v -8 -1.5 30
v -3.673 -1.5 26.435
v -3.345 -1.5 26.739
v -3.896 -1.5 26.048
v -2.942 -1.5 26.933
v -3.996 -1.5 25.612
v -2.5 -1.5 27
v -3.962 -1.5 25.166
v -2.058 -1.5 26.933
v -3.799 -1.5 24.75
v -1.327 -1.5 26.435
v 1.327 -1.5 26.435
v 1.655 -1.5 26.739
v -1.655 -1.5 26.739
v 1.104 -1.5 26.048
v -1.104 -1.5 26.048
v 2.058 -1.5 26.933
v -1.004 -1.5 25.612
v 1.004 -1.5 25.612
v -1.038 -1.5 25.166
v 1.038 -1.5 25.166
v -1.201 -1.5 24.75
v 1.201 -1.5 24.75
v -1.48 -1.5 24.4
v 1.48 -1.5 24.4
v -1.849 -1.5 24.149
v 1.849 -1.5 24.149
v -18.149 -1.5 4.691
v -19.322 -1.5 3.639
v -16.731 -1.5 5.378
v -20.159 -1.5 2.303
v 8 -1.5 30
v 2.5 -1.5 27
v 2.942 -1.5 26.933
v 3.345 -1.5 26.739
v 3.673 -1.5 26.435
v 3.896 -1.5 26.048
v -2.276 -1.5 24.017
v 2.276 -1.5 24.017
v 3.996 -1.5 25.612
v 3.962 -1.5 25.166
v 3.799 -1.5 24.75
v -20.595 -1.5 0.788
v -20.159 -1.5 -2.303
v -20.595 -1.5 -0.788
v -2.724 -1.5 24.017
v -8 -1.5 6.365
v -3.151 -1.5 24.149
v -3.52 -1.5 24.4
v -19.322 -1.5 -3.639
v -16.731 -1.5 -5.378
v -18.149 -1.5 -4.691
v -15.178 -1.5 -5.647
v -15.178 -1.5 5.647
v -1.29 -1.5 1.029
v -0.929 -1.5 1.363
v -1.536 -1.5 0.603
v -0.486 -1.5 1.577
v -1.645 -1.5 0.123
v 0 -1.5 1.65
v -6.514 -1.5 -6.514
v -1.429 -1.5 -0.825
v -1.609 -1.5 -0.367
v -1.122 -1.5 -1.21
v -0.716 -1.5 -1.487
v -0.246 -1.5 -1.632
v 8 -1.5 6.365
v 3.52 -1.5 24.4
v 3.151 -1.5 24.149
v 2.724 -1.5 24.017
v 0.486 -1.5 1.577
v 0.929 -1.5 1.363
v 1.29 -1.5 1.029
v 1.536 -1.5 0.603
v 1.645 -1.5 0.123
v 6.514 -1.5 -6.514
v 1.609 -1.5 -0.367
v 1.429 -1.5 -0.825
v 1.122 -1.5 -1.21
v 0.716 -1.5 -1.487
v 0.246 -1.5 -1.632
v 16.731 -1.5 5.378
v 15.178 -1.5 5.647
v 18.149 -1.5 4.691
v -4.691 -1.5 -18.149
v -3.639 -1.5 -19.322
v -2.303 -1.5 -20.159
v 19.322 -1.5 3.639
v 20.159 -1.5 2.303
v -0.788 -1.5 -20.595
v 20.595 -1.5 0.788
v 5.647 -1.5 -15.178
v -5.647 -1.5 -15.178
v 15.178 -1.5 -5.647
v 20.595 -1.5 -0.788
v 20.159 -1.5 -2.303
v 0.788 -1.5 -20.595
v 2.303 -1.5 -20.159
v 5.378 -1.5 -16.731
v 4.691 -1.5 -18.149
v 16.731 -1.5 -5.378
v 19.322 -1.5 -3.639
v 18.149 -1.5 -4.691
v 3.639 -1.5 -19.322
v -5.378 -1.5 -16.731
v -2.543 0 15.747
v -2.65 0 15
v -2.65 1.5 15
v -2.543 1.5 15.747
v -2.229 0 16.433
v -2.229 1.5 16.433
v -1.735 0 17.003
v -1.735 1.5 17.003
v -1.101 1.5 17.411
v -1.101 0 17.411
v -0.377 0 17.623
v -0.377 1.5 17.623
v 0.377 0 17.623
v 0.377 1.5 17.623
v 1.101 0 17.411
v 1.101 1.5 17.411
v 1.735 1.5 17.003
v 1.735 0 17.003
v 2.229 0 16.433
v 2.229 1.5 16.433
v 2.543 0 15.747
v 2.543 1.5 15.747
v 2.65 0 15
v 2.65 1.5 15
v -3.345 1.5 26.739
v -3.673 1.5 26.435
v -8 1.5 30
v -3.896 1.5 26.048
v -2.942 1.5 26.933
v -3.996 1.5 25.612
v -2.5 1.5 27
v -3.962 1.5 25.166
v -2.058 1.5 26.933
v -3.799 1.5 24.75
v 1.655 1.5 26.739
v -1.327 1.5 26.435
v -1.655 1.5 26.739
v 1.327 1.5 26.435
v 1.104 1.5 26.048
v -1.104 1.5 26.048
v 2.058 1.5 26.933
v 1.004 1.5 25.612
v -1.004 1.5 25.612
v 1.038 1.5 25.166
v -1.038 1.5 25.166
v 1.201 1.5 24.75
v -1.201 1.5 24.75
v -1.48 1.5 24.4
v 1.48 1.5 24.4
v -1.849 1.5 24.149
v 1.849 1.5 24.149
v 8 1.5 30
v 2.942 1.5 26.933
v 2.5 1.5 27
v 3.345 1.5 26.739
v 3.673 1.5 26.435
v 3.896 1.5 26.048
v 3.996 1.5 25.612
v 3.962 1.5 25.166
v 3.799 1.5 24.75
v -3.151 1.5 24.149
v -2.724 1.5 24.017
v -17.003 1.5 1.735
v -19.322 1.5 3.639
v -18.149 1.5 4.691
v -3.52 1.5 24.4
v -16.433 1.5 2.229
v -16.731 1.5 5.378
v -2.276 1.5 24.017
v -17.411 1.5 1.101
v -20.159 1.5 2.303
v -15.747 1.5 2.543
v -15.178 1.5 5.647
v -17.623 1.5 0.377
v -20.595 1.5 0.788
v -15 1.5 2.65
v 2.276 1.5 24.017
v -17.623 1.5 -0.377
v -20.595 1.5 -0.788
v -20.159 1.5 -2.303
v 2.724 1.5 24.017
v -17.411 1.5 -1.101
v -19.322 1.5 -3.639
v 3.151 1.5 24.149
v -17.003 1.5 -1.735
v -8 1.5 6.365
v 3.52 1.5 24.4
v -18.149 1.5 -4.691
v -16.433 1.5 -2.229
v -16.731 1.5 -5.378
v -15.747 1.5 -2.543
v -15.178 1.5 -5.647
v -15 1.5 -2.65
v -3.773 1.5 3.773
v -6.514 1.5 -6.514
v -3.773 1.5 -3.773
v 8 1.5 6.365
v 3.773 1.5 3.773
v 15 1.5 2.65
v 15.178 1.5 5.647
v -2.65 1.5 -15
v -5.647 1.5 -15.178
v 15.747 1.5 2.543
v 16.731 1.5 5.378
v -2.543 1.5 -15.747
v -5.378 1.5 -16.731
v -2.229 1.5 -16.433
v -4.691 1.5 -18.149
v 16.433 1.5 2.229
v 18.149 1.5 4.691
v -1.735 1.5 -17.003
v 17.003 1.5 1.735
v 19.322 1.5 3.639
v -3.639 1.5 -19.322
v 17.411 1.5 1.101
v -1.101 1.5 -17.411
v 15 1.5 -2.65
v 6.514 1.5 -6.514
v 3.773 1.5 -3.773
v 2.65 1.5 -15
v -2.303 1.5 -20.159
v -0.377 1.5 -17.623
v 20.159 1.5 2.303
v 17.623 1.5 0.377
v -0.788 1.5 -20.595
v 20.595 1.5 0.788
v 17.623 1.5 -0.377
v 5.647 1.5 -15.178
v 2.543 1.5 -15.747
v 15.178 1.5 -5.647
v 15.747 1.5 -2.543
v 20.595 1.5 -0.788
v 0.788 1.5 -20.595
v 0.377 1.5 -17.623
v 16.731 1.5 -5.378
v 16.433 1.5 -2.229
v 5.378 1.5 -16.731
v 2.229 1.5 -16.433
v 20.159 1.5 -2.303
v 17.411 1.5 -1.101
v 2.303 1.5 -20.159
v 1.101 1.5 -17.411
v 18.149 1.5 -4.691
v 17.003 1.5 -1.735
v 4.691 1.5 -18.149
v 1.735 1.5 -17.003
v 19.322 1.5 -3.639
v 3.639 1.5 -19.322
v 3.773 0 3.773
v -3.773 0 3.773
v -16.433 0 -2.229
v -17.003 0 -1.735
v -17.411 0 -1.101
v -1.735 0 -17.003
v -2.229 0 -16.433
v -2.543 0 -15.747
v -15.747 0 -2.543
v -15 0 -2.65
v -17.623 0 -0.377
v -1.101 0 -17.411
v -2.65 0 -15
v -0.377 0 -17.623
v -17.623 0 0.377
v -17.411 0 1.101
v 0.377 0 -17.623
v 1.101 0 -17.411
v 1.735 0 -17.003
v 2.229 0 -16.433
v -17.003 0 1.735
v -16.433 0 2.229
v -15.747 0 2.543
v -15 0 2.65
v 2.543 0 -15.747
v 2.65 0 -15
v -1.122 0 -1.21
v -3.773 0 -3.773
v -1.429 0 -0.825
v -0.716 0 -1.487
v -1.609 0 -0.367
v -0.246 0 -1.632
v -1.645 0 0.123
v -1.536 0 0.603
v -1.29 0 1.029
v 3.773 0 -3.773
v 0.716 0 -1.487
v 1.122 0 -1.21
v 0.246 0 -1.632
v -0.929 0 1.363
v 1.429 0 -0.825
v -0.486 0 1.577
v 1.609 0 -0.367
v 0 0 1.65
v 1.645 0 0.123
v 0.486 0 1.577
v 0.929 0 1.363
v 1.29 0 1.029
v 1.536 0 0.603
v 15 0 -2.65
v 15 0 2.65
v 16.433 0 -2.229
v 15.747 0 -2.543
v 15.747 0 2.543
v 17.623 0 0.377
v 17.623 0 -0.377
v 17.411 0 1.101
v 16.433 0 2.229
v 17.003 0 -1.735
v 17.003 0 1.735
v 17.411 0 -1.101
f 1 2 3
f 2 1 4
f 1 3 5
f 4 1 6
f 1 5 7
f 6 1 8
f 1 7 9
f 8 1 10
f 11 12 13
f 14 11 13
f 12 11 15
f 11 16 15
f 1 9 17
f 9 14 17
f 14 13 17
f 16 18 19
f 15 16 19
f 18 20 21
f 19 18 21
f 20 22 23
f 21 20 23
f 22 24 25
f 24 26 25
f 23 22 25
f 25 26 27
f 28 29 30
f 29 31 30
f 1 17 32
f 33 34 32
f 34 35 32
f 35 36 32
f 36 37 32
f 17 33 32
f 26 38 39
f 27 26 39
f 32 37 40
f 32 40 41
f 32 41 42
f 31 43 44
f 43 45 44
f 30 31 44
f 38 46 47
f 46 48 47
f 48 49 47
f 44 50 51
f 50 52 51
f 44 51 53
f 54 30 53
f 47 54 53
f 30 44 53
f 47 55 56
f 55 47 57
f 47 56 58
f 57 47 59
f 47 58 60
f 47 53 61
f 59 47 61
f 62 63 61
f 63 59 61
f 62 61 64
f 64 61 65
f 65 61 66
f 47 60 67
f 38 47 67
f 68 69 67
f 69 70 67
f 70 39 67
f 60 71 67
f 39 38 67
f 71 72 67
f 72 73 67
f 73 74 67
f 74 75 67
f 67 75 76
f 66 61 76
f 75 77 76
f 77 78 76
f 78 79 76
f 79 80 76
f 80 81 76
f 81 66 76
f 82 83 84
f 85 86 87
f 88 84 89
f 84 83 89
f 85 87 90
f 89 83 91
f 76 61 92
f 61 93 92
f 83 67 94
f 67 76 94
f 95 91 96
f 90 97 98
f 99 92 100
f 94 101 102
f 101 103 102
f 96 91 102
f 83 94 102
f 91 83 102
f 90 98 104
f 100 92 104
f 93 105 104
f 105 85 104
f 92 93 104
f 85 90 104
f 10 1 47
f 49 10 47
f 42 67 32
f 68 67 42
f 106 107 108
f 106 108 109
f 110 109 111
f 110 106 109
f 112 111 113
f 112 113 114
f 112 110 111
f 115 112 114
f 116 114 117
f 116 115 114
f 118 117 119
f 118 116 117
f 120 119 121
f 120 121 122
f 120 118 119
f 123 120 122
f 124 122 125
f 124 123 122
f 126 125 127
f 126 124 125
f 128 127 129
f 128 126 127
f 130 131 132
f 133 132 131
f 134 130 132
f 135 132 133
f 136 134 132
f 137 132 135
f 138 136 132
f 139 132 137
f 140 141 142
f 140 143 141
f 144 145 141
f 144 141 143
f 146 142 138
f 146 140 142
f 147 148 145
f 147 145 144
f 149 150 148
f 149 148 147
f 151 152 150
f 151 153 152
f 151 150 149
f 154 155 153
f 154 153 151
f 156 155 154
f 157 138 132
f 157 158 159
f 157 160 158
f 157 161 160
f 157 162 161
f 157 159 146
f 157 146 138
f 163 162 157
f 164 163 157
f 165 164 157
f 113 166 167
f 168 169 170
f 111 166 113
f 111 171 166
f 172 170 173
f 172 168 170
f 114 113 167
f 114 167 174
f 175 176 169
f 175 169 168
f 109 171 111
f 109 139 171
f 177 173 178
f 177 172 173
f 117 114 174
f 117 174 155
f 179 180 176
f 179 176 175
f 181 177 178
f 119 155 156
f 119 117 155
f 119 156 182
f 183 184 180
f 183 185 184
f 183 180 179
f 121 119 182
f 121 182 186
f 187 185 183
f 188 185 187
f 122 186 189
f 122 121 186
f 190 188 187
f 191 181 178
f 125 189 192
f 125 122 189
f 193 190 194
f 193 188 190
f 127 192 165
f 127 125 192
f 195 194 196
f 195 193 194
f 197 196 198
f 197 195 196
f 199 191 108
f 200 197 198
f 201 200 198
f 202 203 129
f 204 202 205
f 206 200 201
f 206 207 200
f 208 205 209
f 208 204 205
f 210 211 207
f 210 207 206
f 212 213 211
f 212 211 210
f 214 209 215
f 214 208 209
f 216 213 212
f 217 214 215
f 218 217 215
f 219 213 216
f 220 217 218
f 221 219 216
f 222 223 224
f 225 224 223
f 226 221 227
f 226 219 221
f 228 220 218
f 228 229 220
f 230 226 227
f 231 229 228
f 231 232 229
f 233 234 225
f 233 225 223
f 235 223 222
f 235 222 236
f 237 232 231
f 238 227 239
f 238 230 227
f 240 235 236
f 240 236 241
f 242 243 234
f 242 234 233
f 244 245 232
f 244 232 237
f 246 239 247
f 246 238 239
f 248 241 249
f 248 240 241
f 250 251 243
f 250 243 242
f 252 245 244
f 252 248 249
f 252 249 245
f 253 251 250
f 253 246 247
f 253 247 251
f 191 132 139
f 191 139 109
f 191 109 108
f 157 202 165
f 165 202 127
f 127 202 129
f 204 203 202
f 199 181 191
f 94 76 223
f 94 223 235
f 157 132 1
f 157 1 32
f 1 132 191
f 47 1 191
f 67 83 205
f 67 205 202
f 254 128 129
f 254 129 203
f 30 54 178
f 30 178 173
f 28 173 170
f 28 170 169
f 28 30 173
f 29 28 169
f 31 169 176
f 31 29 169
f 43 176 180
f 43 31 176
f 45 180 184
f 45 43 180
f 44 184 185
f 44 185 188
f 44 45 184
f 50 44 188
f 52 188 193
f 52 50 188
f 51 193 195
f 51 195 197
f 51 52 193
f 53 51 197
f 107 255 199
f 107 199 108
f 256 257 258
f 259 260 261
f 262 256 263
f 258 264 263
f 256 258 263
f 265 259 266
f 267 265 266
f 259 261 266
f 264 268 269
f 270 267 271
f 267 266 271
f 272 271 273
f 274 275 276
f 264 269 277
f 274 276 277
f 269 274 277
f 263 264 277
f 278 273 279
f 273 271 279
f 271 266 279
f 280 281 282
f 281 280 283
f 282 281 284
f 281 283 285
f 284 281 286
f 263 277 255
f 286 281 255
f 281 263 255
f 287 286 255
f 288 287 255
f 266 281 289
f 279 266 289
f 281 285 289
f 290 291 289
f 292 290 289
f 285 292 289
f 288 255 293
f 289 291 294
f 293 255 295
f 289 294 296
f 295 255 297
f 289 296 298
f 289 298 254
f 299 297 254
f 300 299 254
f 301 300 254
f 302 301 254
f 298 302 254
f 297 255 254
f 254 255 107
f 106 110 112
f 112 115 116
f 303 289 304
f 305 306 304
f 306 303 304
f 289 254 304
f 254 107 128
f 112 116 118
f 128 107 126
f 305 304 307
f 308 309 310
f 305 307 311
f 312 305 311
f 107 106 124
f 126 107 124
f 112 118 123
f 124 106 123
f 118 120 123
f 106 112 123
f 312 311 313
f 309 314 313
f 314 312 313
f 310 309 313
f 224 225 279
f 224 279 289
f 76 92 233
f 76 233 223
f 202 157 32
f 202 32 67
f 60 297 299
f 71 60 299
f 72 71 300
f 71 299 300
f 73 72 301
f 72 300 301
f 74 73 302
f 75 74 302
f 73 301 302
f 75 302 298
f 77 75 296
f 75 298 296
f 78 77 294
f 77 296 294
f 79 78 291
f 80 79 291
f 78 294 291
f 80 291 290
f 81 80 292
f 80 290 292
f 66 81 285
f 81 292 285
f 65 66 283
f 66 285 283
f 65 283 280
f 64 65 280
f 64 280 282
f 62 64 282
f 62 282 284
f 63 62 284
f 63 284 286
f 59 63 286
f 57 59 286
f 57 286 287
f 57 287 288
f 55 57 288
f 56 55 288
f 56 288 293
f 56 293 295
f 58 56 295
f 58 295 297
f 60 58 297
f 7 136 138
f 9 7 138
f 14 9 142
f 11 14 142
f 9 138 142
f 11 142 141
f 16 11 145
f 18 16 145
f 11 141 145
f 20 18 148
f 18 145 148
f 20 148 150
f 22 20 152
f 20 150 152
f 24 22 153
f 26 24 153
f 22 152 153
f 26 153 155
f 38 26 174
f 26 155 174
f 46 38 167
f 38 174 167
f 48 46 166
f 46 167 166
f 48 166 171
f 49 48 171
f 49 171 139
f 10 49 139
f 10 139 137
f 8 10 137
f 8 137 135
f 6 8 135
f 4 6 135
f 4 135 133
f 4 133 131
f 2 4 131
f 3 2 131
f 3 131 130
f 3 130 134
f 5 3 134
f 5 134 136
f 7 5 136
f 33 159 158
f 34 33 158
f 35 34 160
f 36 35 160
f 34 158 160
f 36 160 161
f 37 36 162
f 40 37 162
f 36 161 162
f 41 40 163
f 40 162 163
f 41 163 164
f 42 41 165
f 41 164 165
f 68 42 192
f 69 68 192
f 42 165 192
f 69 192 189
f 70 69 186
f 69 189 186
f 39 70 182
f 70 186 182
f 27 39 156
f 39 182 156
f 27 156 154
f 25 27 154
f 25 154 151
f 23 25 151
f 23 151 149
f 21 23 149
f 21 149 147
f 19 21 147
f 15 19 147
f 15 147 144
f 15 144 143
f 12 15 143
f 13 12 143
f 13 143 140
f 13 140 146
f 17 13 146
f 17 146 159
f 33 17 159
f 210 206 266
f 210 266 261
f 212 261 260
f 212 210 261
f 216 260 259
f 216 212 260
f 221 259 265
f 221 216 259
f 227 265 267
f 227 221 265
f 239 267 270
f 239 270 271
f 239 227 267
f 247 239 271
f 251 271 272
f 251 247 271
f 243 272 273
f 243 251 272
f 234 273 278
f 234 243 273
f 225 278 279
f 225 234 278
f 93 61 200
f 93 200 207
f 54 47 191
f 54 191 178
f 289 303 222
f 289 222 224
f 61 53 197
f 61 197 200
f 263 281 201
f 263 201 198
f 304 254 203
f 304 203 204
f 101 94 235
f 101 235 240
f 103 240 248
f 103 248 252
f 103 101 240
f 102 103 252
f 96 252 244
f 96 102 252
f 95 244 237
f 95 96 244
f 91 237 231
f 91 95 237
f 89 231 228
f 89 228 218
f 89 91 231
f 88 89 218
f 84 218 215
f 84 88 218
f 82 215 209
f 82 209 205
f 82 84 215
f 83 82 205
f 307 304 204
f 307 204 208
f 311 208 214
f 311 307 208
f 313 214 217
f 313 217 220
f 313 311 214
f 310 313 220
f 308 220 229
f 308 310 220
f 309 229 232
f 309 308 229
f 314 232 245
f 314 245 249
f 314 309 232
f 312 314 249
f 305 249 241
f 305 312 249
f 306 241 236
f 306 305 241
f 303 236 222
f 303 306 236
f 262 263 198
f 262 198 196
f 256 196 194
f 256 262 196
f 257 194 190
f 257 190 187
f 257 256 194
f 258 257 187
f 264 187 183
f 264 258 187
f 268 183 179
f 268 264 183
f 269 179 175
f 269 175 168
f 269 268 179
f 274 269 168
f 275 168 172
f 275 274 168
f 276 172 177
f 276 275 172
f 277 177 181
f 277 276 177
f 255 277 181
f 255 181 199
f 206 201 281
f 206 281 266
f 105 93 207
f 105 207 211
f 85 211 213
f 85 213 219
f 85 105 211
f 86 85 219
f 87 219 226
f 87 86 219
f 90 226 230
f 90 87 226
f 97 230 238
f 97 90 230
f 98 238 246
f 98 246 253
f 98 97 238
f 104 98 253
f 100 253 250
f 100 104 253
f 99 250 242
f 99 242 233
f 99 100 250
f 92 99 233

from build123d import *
from build123d.topology import SkipClean

# Parameters (mm, degrees)
SKETCH1_R               = 21
BOSS_EXTRUDE1_DEPTH     = 1.5
SKETCH2_R               = 2.65
CUT_EXTRUDE1_DEPTH      = 1.5
SKETCH5_W               = 16
SKETCH5_H               = 30
BOSS_EXTRUDE2_DEPTH     = 1.5
CIRPATTERN1_DEPTH       = 1.5
CUT_EXTRUDE4_REACH      = 38.65
SKETCH4_R               = 1.65
CUT_EXTRUDE5_REACH      = 38.742
SKETCH6_R               = 1.5
CUT_EXTRUDE6_DEPTH      = 37.650375169
CUT_EXTRUDE6_DEPTH_BACK = 37.650375169


# Read off the part's stored shape, not the designer's step: CirPattern1
with BuildPart() as part:
    # Sketch1 → Boss-Extrude1 (new, symmetric)
    with BuildSketch(Plane(origin=(0, 0, 0), x_dir=(1, 0, 0), z_dir=(0, 1, 0))):
        with Locations(Location((0, 0, 0), (0, 0, 270))):
            Circle(SKETCH1_R)
    extrude(amount=BOSS_EXTRUDE1_DEPTH, both=True)

    # Sketch2 → Cut-Extrude1 (cut)
    with BuildSketch(Plane(origin=(0, 1.5, 0), x_dir=(1, 0, 0), z_dir=(0, 1, 0))):
        with Locations((0, -15)):
            Circle(SKETCH2_R)
        with BuildLine():
            ThreePointArc((-2.65, -15), (0, -12.35), (2.65, -15))
            Line((2.65, -15), (4.067821782, -0.821782178))
            ThreePointArc((4.067821782, -0.821782178), (0, -4.15), (-4.067821782, -0.821782178))
            Line((-4.067821782, -0.821782178), (-2.65, -15))
        make_face()
        with BuildLine():
            ThreePointArc((-4.067821782, -0.821782178), (0, -4.15), (4.067821782, -0.821782178))
            Line((4.067821782, -0.821782178), (4.15, 0))
            ThreePointArc((4.15, 0), (0, 4.15), (-4.15, 0))
            Line((-4.15, 0), (-4.067821782, -0.821782178))
        make_face()
    cut_extrude1 = extrude(amount=-CUT_EXTRUDE1_DEPTH, mode=Mode.SUBTRACT)

    # Sketch5 → Boss-Extrude2 (add, symmetric)
    with BuildSketch(Plane(origin=(0, 0, 0), x_dir=(1, 0, 0), z_dir=(0, 1, 0))):
        with Locations((0, -15)):
            Rectangle(SKETCH5_W, SKETCH5_H)
    extrude(amount=BOSS_EXTRUDE2_DEPTH, both=True)

    # Mirror1: Cut-Extrude1 across plane
    with SkipClean():  # the faces are left unmerged after this step: merging them gives an invalid solid
        add(cut_extrude1.mirror(Plane.XY), mode=Mode.SUBTRACT)

    # CirPattern1 outline → CirPattern1 (cut)
    with BuildSketch(Plane(origin=(0, 0, 0), x_dir=(1, 0, 0), z_dir=(0, 1, 0))):
        with BuildLine():
            Line((3.772727273, -3.772727273), (15, -2.65))
            ThreePointArc((15, -2.65), (17.65, 0), (15, 2.65))
            Line((15, 2.65), (3.772727273, 3.772727273))
            Line((3.772727273, 3.772727273), (4.067821782, 0.821782178))
            ThreePointArc((4.067821782, 0.821782178), (0, -4.15), (-4.067821782, 0.821782178))
            Line((-4.067821782, 0.821782178), (-3.772727273, 3.772727273))
            Line((-3.772727273, 3.772727273), (-15, 2.65))
            ThreePointArc((-15, 2.65), (-17.65, 0), (-15, -2.65))
            Line((-15, -2.65), (-3.772727273, -3.772727273))
            Line((-3.772727273, -3.772727273), (-2.65, -15))
            ThreePointArc((-2.65, -15), (0, -17.65), (2.65, -15))
            Line((2.65, -15), (3.772727273, -3.772727273))
        make_face()
    extrude(amount=CIRPATTERN1_DEPTH, mode=Mode.SUBTRACT)

    # Sketch4 → Cut-Extrude4 (cut, up to next)
    with BuildSketch(Plane(origin=(0, 0, 0), x_dir=(1, 0, 0), z_dir=(0, 1, 0)), mode=Mode.PRIVATE) as cut_extrude4_sk1:
        with Locations(Location((0, 0, 0), (0, 0, 270))):
            Circle(SKETCH4_R)
    cut_extrude4_tool1 = extrude(cut_extrude4_sk1.sketch, amount=-CUT_EXTRUDE4_REACH, mode=Mode.PRIVATE) & part.part
    add(cut_extrude4_tool1.solids().sort_by_distance((0, 0, 0))[0], mode=Mode.SUBTRACT)

    # Sketch6 → Cut-Extrude5 (cut, up to next)
    with BuildSketch(Plane(origin=(0, 1.5, 0), x_dir=(1, 0, 0), z_dir=(0, 1, 0)), mode=Mode.PRIVATE) as cut_extrude5_sk1:
        with Locations(Location((2.5, -25.5, 0), (0, 0, 270))):
            Circle(SKETCH6_R)
    cut_extrude5_tool1 = extrude(cut_extrude5_sk1.sketch, amount=-CUT_EXTRUDE5_REACH, mode=Mode.PRIVATE) & part.part
    # Sketch6 → Cut-Extrude5 (cut, up to next)
    with BuildSketch(Plane(origin=(0, 1.5, 0), x_dir=(1, 0, 0), z_dir=(0, 1, 0)), mode=Mode.PRIVATE) as cut_extrude5_sk2:
        with Locations(Location((-2.5, -25.5, 0), (0, 0, 270))):
            Circle(SKETCH6_R)
    cut_extrude5_tool2 = extrude(cut_extrude5_sk2.sketch, amount=-CUT_EXTRUDE5_REACH, mode=Mode.PRIVATE) & part.part
    add(cut_extrude5_tool1.solids().sort_by_distance((2.5, 1.5, 25.5))[0], mode=Mode.SUBTRACT)
    add(cut_extrude5_tool2.solids().sort_by_distance((-2.5, 1.5, 25.5))[0], mode=Mode.SUBTRACT)

    # Sketch7 → Cut-Extrude6 (cut, two sides: drawn at the far end of the back side and taken through both)
    with BuildSketch(Plane(origin=(0, 0, 0), x_dir=(1, 0, 0), z_dir=(0, 1, 0)).offset(-CUT_EXTRUDE6_DEPTH_BACK)):
        with BuildLine():
            ThreePointArc((8, -19.416487839), (0, 21), (-8, -19.416487839))
            Line((-8, -19.416487839), (-8, -6.364962686))
            Line((-8, -6.364962686), (-15.177522436, -5.647210443))
            ThreePointArc((-15.177522436, -5.647210443), (-20.65, 0), (-15.177522436, 5.647210443))
            Line((-15.177522436, 5.647210443), (-6.513602442, 6.513602442))
            Line((-6.513602442, 6.513602442), (-5.647210443, 15.177522436))
            ThreePointArc((-5.647210443, 15.177522436), (0, 20.65), (5.647210443, 15.177522436))
            Line((5.647210443, 15.177522436), (6.513602442, 6.513602442))
            Line((6.513602442, 6.513602442), (15.177522436, 5.647210443))
            ThreePointArc((15.177522436, 5.647210443), (20.65, 0), (15.177522436, -5.647210443))
            Line((15.177522436, -5.647210443), (8, -6.364962686))
            Line((8, -6.364962686), (8, -19.416487839))
        make_face()
    extrude(amount=CUT_EXTRUDE6_DEPTH + CUT_EXTRUDE6_DEPTH_BACK, mode=Mode.SUBTRACT)


solid = part.part
